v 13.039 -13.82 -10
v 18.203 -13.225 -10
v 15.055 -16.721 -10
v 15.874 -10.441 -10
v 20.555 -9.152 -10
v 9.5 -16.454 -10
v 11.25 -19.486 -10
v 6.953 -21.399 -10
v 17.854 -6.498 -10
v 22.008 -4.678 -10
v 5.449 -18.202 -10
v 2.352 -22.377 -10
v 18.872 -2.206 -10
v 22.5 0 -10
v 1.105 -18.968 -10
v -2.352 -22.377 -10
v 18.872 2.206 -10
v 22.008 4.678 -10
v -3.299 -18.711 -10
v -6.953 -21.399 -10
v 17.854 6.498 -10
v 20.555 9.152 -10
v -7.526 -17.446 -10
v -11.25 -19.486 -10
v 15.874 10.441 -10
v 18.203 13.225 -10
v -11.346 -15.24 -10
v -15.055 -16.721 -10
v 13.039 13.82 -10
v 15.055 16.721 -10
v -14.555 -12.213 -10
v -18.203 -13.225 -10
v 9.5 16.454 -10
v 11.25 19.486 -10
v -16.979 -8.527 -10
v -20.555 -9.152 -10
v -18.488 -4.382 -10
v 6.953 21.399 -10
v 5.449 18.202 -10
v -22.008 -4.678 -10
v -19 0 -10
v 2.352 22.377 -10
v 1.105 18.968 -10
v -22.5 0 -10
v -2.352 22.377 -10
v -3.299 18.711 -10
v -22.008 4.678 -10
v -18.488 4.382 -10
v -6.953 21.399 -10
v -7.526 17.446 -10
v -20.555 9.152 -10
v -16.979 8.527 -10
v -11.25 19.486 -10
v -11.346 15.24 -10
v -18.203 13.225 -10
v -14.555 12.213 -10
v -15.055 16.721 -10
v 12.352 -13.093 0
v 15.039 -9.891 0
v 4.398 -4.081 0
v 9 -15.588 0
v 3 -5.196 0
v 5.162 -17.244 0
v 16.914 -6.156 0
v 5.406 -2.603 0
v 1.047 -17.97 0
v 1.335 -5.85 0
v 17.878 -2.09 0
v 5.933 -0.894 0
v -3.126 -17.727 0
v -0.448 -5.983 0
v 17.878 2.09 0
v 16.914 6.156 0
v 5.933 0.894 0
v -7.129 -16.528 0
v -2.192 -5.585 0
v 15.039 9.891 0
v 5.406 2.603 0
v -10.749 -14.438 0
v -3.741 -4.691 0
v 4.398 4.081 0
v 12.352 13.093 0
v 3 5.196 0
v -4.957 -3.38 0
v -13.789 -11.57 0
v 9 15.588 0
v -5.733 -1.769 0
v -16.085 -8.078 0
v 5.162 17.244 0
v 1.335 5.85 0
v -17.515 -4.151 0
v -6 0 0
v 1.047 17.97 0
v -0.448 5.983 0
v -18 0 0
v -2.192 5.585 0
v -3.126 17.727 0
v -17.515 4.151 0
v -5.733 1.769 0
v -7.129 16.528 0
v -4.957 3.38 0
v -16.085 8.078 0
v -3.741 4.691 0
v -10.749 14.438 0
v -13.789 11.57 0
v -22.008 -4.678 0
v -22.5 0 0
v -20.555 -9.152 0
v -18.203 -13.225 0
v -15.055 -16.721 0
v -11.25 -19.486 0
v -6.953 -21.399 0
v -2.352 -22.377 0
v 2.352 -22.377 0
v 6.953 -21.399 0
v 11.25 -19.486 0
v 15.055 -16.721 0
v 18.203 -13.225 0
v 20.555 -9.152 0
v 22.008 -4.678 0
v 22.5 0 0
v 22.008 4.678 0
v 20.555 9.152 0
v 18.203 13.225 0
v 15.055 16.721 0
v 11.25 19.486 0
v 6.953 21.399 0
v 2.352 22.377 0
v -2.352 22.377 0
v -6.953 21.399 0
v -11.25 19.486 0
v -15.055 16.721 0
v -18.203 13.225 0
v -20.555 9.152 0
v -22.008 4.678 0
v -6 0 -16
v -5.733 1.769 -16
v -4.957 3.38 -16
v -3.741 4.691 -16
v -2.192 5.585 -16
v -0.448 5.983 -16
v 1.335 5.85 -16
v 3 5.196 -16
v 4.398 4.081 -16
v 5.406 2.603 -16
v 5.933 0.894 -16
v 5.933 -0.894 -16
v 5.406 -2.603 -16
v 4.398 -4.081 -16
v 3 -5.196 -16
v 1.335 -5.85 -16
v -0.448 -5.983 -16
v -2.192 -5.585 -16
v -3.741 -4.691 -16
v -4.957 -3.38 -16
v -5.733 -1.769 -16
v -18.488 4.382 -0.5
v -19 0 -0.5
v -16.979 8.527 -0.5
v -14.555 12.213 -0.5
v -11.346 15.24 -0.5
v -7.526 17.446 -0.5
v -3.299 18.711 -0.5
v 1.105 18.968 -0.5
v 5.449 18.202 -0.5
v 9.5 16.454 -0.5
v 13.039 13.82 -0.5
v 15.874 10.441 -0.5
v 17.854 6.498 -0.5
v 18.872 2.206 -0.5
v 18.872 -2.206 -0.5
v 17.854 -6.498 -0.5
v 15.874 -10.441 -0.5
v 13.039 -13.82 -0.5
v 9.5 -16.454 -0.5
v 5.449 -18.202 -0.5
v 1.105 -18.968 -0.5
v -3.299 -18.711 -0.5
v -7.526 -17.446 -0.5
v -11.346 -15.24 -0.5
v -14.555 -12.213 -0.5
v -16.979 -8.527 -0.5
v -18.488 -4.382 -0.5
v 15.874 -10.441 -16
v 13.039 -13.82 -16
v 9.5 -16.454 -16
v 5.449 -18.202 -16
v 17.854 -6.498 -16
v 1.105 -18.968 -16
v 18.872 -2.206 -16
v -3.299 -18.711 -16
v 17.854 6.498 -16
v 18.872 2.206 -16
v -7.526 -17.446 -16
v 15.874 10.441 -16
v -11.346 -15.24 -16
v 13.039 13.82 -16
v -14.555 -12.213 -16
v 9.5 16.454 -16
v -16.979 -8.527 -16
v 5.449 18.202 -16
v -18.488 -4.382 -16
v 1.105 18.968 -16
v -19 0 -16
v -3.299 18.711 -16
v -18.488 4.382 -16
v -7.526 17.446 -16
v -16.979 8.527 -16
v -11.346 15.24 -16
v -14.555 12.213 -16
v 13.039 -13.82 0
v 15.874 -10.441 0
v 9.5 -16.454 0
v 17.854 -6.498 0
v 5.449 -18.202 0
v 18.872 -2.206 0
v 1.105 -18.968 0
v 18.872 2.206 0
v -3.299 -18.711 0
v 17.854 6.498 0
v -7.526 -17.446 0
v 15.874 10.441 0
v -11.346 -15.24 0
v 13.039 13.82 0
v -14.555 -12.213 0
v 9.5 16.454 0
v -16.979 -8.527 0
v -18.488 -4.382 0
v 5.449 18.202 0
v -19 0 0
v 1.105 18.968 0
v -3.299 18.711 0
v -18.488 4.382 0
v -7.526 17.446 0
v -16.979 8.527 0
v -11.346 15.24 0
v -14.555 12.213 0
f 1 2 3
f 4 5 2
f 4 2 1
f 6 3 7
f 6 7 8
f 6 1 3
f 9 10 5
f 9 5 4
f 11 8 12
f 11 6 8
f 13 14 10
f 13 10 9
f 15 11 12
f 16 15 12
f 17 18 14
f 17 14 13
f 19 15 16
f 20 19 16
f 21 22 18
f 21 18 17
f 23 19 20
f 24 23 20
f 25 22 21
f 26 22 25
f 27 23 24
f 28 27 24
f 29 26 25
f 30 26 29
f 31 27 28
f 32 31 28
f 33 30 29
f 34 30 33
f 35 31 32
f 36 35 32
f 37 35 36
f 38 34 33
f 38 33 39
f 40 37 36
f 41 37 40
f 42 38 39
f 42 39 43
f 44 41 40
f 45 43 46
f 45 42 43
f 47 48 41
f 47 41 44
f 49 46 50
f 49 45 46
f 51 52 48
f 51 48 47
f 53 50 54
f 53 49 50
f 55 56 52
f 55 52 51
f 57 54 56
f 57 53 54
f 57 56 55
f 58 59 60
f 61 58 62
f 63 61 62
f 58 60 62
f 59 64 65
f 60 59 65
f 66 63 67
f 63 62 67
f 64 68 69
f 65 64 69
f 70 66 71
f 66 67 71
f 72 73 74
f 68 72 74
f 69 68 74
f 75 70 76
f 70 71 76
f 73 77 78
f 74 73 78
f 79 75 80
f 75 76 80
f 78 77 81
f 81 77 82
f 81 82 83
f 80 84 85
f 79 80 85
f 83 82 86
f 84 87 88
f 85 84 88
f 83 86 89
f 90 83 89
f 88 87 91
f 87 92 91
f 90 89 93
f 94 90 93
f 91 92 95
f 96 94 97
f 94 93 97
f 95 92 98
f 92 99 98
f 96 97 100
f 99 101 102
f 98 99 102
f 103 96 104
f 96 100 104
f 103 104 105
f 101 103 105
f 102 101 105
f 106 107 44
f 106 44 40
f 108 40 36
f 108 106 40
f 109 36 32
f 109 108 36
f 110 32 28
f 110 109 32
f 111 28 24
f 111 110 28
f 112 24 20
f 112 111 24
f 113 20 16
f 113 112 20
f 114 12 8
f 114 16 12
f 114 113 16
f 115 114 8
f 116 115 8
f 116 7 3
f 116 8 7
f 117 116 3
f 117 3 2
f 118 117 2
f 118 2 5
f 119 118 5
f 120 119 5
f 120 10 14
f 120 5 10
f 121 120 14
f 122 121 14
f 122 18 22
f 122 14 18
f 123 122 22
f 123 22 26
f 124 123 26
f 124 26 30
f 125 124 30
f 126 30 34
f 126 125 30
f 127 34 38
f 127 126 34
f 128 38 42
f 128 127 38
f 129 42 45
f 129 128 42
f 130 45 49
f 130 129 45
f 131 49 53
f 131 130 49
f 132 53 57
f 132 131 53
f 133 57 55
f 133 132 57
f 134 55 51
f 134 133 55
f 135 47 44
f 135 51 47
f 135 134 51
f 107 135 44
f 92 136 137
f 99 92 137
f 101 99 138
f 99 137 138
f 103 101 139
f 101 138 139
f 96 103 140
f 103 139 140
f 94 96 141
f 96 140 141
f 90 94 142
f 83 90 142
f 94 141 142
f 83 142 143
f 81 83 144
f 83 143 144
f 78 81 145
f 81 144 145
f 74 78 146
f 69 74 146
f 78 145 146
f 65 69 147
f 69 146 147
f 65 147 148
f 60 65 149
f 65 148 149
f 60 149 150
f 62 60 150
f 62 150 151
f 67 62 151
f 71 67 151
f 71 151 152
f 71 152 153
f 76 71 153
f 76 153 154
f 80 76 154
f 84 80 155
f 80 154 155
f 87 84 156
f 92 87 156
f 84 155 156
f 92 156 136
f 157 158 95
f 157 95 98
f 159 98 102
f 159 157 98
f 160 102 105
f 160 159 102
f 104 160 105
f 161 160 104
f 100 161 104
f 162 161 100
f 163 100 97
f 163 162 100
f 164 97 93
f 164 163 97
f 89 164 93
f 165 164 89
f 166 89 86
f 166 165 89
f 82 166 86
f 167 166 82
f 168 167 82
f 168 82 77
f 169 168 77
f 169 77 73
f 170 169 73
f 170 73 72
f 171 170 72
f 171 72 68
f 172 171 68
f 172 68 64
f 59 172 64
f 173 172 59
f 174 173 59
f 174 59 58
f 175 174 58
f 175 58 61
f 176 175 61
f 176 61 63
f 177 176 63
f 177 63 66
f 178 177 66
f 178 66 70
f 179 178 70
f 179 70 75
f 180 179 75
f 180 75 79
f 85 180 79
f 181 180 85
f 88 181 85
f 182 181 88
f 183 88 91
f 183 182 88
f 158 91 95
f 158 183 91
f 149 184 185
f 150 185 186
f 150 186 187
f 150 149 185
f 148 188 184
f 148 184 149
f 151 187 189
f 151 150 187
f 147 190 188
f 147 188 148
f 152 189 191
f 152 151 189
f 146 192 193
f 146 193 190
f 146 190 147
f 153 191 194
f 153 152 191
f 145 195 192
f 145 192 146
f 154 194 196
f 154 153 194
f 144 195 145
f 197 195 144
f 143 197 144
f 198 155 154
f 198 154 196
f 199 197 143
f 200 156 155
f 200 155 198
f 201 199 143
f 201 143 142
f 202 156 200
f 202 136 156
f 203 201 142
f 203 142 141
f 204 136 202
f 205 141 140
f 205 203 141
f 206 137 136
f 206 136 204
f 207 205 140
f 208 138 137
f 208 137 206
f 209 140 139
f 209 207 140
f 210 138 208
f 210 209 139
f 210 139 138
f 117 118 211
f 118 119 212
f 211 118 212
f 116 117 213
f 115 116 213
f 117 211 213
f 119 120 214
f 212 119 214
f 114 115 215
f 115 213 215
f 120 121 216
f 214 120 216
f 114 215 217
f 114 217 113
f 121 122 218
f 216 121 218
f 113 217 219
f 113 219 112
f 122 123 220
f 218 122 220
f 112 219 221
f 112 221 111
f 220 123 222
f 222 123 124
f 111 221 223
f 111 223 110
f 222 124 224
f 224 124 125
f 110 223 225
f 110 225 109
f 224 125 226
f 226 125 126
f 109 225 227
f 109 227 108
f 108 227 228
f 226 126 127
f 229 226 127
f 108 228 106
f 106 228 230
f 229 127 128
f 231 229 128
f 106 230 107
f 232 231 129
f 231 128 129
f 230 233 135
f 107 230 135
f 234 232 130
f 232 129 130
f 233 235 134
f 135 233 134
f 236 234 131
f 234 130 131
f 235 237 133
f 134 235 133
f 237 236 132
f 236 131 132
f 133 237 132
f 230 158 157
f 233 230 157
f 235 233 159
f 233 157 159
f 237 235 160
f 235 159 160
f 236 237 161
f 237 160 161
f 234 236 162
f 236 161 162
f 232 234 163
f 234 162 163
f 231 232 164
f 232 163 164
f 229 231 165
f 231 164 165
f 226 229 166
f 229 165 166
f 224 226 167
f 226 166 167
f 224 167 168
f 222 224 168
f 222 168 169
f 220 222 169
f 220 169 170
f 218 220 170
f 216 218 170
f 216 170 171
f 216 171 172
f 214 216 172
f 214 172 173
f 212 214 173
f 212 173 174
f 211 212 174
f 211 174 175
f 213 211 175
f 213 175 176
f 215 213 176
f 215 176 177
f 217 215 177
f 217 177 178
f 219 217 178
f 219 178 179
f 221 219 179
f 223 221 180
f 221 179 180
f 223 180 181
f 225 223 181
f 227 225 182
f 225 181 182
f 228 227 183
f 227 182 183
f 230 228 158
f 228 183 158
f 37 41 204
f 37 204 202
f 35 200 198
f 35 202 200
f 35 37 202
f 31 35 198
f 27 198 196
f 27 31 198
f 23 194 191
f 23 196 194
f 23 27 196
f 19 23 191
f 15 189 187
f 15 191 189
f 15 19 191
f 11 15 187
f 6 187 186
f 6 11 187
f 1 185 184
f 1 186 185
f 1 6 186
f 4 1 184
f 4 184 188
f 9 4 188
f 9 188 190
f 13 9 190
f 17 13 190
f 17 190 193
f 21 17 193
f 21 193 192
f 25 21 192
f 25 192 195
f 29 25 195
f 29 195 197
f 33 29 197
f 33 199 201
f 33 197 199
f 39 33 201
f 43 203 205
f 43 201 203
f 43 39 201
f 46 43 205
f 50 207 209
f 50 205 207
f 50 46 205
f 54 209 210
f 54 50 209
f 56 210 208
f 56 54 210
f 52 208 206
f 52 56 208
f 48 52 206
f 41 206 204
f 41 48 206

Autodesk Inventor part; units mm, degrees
ref_plane "YZ Plane" through (0, 0, 0) normal (1, 0, 0) x (0, 1, 0)
ref_plane "XZ Plane" through (0, 0, 0) normal (0, 1, 0) x (-1, 0, 0)
ref_plane "XY Plane" through (0, 0, 0) normal (0, 0, 1) x (1, 0, 0)
sketch "Skizze3" plane through (0, 0, 0) normal (0, 1, 0) x (-1, 0, 0)
  line L0 (0, 0) -> (0, -18.1445)
  line L1 (6, 0) -> (6, -16)
  line L2 (6, -16) -> (19, -16)
  line L3 (19, -16) -> (19, -10)
  line L4 (19, -10) -> (22.5, -10)
  line L5 (22.5, -10) -> (22.5, 0)
  line L6 (22.5, 0) -> (19, 0)
  line L7 (19, 0) -> (19, -0.5)
  line L8 (19, -0.5) -> (18, 0)
  line L9 (18, 0) -> (6, 0)
  point P0 (19, -0.25)
  dimension "d4" = 16
  dimension "d5" = 10
  dimension "d6" = 12
  dimension "d7" = 38
  dimension "d8" = 45
  dimension "d9" = 1
  dimension "d10" = 0.5
revolve "Umdrehung1" add sketch "Skizze3" angle 360 about axis through (0, 0, 0) along (0, 0, -1)
properties part number "BT602_trajan20_21"
